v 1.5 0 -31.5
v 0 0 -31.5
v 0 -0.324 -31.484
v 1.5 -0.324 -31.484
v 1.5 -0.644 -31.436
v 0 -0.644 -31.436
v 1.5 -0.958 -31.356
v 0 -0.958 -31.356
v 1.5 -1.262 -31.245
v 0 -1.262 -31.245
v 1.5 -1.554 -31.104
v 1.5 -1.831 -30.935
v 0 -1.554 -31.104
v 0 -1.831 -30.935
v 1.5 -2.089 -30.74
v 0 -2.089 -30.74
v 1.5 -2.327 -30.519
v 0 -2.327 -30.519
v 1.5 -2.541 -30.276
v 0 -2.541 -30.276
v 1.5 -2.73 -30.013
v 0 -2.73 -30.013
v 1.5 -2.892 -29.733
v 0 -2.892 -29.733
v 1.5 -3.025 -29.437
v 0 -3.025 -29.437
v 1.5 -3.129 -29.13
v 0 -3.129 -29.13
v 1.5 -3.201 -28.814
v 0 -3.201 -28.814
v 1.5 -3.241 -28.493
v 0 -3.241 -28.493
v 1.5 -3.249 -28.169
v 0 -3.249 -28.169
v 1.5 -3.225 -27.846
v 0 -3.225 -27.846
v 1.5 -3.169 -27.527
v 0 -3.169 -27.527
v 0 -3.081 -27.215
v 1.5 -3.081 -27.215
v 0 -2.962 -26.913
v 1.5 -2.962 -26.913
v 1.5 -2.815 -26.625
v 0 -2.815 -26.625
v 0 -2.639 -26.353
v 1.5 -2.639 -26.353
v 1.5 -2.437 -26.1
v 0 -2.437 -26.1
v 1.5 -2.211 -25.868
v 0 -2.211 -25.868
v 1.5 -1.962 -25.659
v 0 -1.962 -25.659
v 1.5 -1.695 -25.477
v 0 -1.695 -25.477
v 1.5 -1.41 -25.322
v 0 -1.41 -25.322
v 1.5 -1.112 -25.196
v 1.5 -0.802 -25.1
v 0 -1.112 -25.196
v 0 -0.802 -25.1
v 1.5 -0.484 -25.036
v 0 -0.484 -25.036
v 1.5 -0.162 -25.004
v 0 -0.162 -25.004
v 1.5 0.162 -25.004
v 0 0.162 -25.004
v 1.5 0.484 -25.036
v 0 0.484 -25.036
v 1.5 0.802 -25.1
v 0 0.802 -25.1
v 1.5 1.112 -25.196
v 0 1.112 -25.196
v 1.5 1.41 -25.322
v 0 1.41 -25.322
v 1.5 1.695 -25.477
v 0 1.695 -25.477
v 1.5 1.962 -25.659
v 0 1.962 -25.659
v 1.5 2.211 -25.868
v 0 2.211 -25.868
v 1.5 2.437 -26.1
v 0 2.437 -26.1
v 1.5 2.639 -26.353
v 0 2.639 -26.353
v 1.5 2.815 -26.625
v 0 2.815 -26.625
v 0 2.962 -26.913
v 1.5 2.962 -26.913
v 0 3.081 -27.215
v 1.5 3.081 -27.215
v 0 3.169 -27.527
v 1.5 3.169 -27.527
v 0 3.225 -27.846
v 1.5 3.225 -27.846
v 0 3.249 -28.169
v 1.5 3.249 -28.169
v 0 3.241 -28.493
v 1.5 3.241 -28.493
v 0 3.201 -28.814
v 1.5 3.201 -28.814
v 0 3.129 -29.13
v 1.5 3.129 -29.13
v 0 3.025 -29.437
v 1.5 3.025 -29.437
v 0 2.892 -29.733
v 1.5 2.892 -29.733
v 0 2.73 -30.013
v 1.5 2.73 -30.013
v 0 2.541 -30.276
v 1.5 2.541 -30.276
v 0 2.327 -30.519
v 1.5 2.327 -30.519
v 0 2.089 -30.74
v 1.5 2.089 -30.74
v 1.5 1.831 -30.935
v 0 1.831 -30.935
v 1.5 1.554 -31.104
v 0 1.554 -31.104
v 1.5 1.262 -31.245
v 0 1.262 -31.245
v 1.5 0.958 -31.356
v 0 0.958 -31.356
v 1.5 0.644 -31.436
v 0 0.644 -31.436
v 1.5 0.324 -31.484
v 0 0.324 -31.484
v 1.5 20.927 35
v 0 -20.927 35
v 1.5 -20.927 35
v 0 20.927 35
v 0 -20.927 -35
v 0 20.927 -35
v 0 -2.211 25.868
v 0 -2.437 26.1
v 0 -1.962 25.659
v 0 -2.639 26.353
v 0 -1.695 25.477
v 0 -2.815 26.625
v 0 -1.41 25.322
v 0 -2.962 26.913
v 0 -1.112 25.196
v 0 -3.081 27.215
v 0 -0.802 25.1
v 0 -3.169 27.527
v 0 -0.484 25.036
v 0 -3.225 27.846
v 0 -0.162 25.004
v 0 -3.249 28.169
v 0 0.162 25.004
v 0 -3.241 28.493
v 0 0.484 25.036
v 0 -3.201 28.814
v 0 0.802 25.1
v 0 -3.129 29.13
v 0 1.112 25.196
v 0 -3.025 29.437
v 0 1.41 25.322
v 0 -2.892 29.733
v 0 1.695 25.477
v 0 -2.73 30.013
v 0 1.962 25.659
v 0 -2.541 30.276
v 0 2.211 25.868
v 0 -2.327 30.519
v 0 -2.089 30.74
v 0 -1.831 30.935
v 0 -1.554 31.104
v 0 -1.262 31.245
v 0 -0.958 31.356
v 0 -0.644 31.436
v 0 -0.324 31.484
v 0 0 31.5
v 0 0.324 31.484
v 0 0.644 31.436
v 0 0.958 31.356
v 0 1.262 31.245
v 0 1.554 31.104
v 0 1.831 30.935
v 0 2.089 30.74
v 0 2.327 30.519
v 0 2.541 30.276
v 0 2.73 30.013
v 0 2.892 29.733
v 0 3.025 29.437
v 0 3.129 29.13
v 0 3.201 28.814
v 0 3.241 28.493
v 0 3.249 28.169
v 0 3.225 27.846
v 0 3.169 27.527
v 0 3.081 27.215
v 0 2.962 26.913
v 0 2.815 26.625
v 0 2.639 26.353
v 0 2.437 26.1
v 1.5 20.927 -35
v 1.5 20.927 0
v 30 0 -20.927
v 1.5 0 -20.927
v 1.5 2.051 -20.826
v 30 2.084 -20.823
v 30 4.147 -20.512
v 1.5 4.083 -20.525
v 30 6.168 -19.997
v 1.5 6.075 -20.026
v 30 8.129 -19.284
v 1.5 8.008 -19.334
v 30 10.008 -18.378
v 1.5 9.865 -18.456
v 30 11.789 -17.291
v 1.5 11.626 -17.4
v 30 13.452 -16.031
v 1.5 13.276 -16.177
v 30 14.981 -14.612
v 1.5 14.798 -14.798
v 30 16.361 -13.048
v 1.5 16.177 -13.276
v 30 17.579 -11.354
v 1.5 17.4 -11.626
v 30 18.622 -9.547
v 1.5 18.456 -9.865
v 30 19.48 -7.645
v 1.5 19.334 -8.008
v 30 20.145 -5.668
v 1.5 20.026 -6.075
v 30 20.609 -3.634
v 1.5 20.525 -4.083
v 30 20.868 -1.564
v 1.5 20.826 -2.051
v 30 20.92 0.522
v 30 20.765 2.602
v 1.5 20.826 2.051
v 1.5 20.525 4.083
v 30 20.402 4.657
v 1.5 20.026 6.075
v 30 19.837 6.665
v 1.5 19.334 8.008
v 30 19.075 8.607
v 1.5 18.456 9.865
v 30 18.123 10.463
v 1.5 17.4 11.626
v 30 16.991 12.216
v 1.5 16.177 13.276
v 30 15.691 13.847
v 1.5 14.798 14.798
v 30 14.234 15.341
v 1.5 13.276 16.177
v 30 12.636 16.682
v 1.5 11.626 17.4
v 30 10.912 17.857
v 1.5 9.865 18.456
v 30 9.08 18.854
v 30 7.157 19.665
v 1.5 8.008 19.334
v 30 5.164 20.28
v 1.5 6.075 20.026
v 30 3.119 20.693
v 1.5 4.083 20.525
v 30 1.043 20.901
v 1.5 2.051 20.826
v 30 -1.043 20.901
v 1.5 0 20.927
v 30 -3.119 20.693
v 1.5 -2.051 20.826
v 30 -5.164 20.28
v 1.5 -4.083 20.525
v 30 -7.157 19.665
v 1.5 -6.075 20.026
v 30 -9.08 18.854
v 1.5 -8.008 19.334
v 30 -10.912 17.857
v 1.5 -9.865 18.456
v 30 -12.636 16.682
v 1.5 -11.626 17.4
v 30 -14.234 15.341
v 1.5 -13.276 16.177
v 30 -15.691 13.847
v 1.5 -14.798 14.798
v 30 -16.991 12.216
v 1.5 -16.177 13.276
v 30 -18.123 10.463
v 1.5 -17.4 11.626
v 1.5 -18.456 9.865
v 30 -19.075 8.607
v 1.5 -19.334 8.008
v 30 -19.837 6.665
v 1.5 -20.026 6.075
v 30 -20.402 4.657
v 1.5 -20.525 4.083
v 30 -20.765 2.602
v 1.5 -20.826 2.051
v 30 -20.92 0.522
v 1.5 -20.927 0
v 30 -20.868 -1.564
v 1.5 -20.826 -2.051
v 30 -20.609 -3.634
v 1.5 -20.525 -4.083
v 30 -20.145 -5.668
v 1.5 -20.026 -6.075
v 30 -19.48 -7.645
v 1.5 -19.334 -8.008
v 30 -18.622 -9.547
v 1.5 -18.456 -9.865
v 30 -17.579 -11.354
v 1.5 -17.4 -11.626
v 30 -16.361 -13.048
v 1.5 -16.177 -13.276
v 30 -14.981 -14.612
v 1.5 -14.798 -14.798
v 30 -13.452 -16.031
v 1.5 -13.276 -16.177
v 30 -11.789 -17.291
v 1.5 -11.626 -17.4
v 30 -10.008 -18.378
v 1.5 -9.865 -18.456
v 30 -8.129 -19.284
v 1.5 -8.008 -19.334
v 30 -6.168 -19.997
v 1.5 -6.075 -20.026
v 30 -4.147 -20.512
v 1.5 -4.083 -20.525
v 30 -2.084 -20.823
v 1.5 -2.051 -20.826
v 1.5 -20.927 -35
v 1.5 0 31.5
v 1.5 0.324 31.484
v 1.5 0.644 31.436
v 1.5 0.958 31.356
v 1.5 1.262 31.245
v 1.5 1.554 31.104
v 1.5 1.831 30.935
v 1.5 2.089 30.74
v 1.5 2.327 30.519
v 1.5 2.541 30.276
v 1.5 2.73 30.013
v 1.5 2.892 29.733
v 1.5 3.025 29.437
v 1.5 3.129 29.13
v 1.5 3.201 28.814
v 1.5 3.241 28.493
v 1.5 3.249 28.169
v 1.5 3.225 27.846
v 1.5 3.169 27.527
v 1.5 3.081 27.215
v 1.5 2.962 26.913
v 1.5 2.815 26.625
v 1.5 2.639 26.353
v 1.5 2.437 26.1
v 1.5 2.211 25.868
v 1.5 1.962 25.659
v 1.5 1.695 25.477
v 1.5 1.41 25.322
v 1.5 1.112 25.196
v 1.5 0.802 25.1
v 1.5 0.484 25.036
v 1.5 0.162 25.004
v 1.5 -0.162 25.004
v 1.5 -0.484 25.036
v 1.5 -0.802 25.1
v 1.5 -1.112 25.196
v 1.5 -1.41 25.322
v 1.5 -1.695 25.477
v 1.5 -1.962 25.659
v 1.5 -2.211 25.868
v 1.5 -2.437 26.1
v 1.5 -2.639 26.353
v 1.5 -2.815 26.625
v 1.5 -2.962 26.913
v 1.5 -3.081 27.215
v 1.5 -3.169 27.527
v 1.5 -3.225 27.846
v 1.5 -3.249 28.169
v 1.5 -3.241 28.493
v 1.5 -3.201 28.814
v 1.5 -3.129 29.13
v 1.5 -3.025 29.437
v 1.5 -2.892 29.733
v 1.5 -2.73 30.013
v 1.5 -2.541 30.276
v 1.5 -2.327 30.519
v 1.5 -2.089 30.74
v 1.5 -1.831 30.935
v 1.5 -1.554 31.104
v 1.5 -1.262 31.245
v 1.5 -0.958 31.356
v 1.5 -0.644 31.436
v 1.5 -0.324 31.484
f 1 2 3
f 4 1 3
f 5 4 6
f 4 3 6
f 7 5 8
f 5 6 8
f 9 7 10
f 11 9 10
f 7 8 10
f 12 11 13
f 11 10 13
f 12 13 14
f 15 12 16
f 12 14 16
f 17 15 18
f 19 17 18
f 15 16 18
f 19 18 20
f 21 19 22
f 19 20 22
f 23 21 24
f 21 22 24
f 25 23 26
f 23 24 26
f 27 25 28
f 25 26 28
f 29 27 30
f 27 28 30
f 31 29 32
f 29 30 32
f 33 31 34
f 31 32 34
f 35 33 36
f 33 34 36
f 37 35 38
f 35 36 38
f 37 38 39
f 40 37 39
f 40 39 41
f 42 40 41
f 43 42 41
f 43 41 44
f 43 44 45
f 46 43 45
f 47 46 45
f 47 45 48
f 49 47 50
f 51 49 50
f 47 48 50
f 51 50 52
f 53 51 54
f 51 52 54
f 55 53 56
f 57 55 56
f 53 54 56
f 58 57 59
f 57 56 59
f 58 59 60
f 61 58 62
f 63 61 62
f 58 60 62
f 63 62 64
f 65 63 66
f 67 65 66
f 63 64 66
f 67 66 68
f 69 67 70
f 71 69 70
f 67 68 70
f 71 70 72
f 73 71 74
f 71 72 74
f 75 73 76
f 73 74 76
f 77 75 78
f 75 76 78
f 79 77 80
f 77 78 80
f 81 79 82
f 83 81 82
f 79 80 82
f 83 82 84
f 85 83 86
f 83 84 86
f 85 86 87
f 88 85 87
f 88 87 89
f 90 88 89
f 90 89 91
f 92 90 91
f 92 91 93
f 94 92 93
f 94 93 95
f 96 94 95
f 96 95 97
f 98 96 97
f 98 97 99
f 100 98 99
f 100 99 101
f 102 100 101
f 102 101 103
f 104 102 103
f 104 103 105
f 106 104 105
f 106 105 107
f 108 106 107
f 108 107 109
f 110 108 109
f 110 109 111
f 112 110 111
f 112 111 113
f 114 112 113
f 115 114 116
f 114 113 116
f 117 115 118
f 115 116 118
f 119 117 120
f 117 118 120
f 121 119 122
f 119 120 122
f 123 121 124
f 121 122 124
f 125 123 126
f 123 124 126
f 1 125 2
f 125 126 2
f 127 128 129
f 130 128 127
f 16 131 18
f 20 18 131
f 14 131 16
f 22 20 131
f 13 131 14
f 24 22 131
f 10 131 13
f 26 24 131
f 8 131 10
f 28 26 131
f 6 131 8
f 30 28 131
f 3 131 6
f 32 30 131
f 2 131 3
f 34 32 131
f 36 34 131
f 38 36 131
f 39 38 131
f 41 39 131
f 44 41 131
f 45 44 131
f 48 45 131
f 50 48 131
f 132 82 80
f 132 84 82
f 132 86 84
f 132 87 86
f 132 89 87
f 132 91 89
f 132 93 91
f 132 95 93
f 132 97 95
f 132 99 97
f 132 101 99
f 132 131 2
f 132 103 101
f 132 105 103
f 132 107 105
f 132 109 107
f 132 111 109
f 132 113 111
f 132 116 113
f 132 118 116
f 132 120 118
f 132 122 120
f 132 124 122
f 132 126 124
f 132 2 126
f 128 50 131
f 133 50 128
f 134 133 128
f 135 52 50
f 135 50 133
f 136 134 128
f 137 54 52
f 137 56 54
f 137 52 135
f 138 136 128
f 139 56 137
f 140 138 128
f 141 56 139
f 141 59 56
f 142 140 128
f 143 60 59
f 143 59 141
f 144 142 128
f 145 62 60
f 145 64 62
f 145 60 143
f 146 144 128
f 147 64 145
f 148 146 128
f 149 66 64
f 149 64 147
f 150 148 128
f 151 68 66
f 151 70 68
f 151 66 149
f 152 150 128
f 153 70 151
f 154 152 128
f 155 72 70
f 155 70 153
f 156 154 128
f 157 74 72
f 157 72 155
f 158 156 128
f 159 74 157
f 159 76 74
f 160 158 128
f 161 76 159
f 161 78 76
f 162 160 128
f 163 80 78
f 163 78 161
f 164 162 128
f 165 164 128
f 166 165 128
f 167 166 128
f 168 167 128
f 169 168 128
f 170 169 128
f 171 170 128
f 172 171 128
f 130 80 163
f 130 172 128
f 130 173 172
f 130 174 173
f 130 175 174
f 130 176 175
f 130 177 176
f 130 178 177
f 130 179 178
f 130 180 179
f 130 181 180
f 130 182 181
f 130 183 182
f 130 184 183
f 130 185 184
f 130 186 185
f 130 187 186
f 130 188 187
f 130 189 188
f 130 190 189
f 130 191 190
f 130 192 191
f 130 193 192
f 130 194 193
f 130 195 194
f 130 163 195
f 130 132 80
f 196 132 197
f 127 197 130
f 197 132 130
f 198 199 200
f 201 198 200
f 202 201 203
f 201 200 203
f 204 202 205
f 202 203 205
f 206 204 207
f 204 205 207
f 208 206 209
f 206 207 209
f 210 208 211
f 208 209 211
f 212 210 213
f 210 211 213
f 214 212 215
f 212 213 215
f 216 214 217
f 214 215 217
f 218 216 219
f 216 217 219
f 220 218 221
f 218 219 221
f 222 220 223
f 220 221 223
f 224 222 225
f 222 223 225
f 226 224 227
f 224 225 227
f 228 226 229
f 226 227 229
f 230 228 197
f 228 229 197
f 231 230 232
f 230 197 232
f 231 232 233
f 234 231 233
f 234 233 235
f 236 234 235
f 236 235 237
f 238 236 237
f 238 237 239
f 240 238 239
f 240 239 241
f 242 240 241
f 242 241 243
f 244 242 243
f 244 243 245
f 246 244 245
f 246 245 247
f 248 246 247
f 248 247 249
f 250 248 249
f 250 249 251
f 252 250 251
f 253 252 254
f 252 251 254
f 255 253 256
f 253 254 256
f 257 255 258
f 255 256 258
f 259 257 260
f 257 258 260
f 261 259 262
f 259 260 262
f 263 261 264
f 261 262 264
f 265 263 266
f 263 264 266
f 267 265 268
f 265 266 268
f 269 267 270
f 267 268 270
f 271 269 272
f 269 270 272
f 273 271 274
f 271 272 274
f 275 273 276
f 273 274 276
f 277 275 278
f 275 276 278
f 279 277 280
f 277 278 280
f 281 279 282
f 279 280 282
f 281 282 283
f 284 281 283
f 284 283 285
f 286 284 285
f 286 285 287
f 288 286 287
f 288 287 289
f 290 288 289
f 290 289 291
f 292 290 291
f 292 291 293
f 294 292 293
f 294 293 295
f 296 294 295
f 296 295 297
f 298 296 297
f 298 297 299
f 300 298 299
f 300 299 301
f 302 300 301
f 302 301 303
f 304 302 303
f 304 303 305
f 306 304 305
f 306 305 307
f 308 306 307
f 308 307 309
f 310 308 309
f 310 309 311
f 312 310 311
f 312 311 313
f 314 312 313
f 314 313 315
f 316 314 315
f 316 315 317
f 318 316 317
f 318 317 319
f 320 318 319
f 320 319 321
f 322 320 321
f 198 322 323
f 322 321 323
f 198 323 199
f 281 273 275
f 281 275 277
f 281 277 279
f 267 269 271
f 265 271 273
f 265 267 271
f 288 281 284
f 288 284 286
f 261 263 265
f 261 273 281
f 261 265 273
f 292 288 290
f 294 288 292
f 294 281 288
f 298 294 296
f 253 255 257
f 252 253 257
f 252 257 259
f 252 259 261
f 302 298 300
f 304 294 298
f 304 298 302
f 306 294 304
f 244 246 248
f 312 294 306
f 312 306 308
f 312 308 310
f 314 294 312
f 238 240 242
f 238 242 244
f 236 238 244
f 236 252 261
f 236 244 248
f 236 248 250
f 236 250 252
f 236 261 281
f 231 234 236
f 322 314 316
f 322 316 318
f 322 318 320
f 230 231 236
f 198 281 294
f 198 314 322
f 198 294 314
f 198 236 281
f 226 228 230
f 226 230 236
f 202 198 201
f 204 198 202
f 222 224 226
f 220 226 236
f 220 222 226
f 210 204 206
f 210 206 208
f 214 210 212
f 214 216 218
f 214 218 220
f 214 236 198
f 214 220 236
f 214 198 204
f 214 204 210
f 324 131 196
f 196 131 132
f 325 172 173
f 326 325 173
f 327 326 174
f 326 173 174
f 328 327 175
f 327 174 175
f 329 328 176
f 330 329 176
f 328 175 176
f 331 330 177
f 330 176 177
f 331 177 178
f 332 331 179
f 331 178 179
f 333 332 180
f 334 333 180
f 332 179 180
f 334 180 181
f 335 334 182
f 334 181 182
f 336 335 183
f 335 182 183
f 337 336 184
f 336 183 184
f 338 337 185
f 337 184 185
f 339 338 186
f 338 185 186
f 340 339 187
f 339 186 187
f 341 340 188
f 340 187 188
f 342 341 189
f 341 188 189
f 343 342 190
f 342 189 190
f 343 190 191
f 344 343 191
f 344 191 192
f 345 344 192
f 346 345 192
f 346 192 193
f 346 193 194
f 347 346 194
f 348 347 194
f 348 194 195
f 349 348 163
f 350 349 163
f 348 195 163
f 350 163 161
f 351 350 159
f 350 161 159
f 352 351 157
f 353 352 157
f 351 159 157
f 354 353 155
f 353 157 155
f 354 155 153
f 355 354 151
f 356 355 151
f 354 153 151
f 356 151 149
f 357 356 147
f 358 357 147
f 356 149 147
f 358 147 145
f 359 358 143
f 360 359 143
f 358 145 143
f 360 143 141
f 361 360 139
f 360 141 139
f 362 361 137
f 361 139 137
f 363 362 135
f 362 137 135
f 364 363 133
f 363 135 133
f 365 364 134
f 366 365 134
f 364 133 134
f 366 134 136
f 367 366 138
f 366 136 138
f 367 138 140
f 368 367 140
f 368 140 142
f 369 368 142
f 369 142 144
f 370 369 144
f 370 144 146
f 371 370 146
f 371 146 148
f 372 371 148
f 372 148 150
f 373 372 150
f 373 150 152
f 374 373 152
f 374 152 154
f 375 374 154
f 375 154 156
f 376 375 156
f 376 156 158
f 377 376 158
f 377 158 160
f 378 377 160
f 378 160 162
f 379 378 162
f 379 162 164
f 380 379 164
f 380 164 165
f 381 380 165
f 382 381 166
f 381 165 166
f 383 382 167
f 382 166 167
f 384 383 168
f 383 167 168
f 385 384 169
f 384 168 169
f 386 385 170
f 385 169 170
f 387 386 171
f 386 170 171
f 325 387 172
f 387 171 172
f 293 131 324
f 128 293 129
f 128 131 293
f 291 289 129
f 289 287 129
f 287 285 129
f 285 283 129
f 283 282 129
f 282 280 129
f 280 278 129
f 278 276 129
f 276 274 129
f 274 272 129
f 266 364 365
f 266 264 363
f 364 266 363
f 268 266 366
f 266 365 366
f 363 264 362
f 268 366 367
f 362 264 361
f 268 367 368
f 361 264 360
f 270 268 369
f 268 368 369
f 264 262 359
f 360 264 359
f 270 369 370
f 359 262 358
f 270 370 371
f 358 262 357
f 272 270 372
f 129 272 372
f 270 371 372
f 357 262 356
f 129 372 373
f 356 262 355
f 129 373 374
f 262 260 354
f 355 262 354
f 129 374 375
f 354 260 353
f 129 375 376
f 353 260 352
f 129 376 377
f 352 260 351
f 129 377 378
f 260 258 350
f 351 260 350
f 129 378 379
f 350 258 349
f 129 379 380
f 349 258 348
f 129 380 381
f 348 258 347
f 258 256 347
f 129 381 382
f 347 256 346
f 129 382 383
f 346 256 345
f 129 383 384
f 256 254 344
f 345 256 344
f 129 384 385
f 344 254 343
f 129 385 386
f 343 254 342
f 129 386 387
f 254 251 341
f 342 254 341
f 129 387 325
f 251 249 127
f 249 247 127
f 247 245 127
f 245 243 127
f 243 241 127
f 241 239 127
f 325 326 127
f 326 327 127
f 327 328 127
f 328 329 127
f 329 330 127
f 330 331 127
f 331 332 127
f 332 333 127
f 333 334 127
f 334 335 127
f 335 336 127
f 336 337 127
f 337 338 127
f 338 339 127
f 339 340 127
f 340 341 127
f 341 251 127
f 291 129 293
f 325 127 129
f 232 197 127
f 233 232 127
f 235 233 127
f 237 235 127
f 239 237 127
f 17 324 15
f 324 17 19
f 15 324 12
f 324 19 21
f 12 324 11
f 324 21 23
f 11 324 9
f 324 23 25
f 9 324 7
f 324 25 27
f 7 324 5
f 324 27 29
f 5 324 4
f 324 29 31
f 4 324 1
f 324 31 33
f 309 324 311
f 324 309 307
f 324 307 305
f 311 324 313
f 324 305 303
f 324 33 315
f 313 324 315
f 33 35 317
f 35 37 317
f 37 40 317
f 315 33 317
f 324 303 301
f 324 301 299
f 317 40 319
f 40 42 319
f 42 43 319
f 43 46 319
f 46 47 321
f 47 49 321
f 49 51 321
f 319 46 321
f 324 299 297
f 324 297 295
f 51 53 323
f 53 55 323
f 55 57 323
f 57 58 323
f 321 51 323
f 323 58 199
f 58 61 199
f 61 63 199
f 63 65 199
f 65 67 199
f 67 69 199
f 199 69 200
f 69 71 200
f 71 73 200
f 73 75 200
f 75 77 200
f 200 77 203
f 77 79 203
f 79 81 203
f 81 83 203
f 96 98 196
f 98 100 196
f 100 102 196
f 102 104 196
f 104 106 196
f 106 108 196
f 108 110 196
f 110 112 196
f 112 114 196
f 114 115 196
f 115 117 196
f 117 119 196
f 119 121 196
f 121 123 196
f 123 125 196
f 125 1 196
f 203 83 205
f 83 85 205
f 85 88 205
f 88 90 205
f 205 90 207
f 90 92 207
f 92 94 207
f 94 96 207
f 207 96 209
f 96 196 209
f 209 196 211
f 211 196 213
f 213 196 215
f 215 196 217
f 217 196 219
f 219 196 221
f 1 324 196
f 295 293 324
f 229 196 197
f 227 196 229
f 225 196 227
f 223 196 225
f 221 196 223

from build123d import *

# Parameters (mm, degrees)
SKETCH1_R           = 20.926913159
BOSS_EXTRUDE2_DEPTH = 30
SKETCH3_W           = 70
SKETCH3_H           = 41.853826318
BOSS_EXTRUDE3_DEPTH = 1.5
SKETCH4_R           = 3.25
CUT_EXTRUDE1_DEPTH  = 1.5


with BuildPart() as part:
    # Sketch1 → Boss-Extrude2 (new body)
    with BuildSketch(Plane(origin=(0, 0, 0), x_dir=(0, 0, -1), z_dir=(1, 0, 0))):
        Circle(SKETCH1_R)
    extrude(amount=BOSS_EXTRUDE2_DEPTH)

    # Sketch3 → Boss-Extrude3 (add)
    with BuildSketch(Plane.ZY):
        Rectangle(SKETCH3_W, SKETCH3_H)
    extrude(amount=-BOSS_EXTRUDE3_DEPTH)

    # Sketch4 → Cut-Extrude1 (cut)
    with BuildSketch(Plane.ZY):
        with Locations((28.25, 0)):
            Circle(SKETCH4_R)
        with Locations(Location((-28.25, 0, 0), (0, 0, 180))):
            Circle(SKETCH4_R)
    extrude(amount=-CUT_EXTRUDE1_DEPTH, mode=Mode.SUBTRACT)


solid = part.part
